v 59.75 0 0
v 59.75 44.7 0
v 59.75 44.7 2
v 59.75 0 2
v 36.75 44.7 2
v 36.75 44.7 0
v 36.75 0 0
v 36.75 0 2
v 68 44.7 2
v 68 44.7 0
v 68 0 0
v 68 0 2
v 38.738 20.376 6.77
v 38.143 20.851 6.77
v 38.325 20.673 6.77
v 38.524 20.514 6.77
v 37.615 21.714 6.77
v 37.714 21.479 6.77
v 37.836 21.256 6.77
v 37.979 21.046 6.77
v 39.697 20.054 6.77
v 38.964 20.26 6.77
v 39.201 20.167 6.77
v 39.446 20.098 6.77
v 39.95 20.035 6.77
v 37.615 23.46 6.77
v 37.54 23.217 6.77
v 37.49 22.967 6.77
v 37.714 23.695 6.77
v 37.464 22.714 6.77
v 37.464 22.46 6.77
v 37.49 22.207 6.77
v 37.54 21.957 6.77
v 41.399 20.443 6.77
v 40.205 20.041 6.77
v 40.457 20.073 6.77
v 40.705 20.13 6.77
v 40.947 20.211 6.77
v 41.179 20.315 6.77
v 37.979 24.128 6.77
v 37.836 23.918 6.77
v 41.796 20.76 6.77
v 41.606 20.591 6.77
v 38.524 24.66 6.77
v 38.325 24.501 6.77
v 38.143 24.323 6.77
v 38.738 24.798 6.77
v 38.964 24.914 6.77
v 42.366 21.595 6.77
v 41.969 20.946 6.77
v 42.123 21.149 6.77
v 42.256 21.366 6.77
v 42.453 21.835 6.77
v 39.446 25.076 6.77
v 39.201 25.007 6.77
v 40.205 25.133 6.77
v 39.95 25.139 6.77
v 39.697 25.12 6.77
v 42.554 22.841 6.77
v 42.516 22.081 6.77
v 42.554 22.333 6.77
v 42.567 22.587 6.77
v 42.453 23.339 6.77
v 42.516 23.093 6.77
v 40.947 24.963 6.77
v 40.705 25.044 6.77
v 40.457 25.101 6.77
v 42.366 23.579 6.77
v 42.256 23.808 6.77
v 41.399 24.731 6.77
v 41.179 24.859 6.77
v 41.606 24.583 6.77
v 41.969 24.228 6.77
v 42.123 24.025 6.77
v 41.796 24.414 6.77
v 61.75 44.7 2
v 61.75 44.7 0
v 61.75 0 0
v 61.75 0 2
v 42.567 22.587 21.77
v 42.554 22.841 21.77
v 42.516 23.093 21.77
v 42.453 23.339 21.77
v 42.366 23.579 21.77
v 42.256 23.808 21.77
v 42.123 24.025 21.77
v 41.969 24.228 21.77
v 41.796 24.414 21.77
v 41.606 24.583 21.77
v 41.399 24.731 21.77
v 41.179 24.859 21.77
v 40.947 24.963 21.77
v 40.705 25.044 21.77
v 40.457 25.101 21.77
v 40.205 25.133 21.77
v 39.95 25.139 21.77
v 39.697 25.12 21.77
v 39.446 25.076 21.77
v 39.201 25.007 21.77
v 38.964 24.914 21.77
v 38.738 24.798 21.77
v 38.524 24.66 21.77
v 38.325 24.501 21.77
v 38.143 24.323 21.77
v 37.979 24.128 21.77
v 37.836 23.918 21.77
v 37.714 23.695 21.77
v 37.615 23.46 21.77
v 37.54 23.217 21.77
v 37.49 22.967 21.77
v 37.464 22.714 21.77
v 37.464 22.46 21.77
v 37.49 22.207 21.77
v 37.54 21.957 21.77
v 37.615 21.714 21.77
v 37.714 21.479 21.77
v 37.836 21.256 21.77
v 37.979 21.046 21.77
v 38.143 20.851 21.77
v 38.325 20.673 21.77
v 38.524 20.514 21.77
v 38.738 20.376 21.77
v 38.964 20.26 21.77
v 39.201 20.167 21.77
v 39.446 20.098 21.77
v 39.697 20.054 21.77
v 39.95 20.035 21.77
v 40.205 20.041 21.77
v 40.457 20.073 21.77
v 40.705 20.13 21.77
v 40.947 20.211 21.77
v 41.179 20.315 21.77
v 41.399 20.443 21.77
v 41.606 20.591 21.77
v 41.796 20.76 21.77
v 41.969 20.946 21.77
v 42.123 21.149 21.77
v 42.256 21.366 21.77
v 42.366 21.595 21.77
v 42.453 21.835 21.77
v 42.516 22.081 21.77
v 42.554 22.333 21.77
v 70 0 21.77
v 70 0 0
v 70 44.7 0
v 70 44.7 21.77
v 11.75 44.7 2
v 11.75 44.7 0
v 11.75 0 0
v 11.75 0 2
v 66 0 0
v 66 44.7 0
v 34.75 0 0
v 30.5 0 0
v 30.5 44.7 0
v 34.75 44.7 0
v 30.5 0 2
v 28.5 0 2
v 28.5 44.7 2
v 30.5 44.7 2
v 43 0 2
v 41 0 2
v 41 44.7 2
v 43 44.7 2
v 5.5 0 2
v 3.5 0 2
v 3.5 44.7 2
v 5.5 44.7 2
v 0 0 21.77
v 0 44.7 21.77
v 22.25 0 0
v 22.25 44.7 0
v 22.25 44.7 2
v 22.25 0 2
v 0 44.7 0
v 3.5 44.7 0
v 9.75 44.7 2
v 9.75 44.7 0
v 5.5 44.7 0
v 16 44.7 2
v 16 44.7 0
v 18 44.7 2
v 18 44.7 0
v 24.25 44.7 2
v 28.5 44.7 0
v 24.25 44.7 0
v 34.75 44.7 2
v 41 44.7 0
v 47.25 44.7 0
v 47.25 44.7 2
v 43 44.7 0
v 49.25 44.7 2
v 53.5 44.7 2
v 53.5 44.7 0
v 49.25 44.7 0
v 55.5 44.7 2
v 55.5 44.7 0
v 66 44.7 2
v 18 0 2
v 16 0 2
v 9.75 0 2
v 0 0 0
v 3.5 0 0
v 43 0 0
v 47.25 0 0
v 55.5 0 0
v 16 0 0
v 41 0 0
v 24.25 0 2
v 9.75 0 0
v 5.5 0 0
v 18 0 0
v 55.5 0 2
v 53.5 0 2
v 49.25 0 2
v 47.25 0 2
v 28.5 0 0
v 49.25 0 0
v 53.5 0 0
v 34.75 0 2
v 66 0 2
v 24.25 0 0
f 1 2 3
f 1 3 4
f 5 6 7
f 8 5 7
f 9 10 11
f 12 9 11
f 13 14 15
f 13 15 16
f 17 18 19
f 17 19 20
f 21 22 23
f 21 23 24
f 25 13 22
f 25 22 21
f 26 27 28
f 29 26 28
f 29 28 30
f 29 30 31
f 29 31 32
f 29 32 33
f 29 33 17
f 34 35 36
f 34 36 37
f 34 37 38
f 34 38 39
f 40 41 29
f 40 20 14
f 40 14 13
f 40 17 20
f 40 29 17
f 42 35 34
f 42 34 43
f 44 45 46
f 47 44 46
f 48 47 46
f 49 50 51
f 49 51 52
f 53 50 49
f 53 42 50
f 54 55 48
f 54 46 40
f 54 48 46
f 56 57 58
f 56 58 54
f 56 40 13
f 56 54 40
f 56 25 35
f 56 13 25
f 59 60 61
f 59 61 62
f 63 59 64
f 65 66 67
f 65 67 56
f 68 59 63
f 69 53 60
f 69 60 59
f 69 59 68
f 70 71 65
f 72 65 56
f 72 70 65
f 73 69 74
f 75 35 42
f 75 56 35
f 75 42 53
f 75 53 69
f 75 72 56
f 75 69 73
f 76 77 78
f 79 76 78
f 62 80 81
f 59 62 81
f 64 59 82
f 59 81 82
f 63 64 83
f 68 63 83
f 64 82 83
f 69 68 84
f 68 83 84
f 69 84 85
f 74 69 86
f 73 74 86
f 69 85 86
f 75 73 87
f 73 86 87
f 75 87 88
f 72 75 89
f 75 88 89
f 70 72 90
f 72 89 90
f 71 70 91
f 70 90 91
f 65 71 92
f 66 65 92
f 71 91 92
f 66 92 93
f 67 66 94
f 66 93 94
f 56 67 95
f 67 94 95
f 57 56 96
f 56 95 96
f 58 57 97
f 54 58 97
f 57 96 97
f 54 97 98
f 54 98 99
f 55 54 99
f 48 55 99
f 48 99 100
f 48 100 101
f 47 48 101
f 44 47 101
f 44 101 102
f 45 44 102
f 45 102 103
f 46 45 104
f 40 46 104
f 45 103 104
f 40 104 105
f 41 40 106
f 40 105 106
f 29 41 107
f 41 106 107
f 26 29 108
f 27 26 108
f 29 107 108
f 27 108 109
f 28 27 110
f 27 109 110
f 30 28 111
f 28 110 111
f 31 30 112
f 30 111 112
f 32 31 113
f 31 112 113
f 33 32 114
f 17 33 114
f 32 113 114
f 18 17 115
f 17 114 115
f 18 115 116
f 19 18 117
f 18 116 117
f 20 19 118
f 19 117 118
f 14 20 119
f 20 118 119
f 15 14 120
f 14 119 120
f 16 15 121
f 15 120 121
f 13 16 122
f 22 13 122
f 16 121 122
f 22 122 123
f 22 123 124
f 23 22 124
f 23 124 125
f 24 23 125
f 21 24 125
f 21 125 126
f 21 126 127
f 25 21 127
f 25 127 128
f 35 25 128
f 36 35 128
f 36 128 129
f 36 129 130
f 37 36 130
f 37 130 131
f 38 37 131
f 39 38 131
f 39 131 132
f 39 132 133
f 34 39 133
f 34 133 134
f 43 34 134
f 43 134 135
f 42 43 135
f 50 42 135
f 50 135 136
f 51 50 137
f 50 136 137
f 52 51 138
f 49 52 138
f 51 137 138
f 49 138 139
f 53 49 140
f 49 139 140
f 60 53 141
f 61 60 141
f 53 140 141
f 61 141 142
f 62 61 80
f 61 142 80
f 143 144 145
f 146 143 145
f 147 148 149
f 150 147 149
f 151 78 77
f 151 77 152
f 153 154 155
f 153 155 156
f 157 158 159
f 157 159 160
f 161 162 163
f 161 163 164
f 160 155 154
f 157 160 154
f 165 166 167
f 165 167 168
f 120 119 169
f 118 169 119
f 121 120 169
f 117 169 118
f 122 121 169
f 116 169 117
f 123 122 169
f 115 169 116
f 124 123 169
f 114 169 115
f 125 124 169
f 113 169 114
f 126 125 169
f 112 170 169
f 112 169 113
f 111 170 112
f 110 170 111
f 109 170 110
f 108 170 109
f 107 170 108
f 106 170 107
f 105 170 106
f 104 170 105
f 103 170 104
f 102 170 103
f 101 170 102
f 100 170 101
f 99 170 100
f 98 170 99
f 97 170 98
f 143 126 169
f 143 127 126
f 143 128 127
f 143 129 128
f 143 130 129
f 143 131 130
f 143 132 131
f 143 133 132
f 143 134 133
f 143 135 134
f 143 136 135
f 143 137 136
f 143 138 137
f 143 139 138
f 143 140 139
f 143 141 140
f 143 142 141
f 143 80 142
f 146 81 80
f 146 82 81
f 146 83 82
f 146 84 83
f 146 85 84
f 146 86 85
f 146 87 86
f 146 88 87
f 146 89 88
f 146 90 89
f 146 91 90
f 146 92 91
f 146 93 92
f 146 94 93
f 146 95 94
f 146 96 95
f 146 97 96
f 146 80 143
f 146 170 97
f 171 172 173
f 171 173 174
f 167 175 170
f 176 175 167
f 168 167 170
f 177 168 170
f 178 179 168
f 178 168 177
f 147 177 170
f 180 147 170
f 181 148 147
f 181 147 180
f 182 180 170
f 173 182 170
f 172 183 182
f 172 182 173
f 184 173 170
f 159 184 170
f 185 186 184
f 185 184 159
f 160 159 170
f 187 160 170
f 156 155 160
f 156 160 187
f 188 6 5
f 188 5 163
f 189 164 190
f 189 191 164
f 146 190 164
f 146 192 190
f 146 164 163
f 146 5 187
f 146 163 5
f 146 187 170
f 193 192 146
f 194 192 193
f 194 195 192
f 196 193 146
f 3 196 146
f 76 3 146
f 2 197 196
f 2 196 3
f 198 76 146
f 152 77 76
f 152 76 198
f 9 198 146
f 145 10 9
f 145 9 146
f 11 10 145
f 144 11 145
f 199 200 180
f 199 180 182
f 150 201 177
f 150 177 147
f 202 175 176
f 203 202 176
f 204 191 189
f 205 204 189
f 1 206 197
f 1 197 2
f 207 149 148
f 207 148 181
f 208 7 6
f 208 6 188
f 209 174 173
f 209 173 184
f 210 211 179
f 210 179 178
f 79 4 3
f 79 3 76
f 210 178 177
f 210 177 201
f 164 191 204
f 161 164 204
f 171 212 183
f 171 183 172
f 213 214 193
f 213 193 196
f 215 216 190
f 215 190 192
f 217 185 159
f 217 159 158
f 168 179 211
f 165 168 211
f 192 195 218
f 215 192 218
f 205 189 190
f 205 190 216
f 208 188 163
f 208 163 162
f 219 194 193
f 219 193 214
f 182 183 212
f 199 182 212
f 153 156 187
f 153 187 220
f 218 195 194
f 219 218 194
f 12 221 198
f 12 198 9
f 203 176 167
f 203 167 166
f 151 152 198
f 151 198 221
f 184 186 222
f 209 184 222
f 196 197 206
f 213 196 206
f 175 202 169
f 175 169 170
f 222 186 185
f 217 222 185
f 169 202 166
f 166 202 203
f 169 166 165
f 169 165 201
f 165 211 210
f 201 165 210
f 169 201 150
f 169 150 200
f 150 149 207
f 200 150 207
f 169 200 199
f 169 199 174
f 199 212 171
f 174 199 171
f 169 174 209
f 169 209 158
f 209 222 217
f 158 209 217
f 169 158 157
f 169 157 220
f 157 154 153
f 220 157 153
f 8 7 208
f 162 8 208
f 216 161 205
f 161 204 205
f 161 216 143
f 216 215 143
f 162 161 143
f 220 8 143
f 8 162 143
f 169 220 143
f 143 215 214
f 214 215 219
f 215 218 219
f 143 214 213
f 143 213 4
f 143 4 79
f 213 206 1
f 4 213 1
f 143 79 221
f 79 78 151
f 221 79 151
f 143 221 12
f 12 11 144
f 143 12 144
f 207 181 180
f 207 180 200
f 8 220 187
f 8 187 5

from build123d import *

# Parameters (mm, degrees)
F0_W     = 70
F0_H     = 44.7
F1_DEPTH = 21.77
F2_R     = 2.5527
F3_DEPTH = 15
F4_W     = 2
F4_H     = 44.7
F5_DEPTH = 2


with BuildPart() as f1:
    # F0 (on Top) → F1 (new body)
    with BuildSketch(Plane.XY):
        with Locations((35, 22.35)):
            Rectangle(F0_W, F0_H)
    extrude(amount=F1_DEPTH)

    # F2 (on face) → F3 (cut)
    with BuildSketch(Plane.XY.offset(21.77)):
        with Locations((40.014, 22.587)):
            Circle(F2_R)
    extrude(amount=-F3_DEPTH, mode=Mode.SUBTRACT)

    # F4 (on face) → F5 (cut)
    with BuildSketch(Plane(origin=(0, 0, 0), x_dir=(1, 0, 0), z_dir=(0, 0, -1))):
        with Locations((67, -22.35)):
            Rectangle(F4_W, F4_H)
        with Locations((60.75, -22.35)):
            Rectangle(F4_W, F4_H)
        with Locations((54.5, -22.35)):
            Rectangle(F4_W, F4_H)
        with Locations((48.25, -22.35)):
            Rectangle(F4_W, F4_H)
        with Locations((42, -22.35)):
            Rectangle(F4_W, F4_H)
        with Locations((35.75, -22.35)):
            Rectangle(F4_W, F4_H)
        with Locations((29.5, -22.35)):
            Rectangle(F4_W, F4_H)
        with Locations((23.25, -22.35)):
            Rectangle(F4_W, F4_H)
        with Locations((17, -22.35)):
            Rectangle(F4_W, F4_H)
        with Locations((10.75, -22.35)):
            Rectangle(F4_W, F4_H)
        with Locations((4.5, -22.35)):
            Rectangle(F4_W, F4_H)
        with Locations((-1.75, -22.35)):
            Rectangle(F4_W, F4_H)
    extrude(amount=-F5_DEPTH, mode=Mode.SUBTRACT)


solid = f1.part
